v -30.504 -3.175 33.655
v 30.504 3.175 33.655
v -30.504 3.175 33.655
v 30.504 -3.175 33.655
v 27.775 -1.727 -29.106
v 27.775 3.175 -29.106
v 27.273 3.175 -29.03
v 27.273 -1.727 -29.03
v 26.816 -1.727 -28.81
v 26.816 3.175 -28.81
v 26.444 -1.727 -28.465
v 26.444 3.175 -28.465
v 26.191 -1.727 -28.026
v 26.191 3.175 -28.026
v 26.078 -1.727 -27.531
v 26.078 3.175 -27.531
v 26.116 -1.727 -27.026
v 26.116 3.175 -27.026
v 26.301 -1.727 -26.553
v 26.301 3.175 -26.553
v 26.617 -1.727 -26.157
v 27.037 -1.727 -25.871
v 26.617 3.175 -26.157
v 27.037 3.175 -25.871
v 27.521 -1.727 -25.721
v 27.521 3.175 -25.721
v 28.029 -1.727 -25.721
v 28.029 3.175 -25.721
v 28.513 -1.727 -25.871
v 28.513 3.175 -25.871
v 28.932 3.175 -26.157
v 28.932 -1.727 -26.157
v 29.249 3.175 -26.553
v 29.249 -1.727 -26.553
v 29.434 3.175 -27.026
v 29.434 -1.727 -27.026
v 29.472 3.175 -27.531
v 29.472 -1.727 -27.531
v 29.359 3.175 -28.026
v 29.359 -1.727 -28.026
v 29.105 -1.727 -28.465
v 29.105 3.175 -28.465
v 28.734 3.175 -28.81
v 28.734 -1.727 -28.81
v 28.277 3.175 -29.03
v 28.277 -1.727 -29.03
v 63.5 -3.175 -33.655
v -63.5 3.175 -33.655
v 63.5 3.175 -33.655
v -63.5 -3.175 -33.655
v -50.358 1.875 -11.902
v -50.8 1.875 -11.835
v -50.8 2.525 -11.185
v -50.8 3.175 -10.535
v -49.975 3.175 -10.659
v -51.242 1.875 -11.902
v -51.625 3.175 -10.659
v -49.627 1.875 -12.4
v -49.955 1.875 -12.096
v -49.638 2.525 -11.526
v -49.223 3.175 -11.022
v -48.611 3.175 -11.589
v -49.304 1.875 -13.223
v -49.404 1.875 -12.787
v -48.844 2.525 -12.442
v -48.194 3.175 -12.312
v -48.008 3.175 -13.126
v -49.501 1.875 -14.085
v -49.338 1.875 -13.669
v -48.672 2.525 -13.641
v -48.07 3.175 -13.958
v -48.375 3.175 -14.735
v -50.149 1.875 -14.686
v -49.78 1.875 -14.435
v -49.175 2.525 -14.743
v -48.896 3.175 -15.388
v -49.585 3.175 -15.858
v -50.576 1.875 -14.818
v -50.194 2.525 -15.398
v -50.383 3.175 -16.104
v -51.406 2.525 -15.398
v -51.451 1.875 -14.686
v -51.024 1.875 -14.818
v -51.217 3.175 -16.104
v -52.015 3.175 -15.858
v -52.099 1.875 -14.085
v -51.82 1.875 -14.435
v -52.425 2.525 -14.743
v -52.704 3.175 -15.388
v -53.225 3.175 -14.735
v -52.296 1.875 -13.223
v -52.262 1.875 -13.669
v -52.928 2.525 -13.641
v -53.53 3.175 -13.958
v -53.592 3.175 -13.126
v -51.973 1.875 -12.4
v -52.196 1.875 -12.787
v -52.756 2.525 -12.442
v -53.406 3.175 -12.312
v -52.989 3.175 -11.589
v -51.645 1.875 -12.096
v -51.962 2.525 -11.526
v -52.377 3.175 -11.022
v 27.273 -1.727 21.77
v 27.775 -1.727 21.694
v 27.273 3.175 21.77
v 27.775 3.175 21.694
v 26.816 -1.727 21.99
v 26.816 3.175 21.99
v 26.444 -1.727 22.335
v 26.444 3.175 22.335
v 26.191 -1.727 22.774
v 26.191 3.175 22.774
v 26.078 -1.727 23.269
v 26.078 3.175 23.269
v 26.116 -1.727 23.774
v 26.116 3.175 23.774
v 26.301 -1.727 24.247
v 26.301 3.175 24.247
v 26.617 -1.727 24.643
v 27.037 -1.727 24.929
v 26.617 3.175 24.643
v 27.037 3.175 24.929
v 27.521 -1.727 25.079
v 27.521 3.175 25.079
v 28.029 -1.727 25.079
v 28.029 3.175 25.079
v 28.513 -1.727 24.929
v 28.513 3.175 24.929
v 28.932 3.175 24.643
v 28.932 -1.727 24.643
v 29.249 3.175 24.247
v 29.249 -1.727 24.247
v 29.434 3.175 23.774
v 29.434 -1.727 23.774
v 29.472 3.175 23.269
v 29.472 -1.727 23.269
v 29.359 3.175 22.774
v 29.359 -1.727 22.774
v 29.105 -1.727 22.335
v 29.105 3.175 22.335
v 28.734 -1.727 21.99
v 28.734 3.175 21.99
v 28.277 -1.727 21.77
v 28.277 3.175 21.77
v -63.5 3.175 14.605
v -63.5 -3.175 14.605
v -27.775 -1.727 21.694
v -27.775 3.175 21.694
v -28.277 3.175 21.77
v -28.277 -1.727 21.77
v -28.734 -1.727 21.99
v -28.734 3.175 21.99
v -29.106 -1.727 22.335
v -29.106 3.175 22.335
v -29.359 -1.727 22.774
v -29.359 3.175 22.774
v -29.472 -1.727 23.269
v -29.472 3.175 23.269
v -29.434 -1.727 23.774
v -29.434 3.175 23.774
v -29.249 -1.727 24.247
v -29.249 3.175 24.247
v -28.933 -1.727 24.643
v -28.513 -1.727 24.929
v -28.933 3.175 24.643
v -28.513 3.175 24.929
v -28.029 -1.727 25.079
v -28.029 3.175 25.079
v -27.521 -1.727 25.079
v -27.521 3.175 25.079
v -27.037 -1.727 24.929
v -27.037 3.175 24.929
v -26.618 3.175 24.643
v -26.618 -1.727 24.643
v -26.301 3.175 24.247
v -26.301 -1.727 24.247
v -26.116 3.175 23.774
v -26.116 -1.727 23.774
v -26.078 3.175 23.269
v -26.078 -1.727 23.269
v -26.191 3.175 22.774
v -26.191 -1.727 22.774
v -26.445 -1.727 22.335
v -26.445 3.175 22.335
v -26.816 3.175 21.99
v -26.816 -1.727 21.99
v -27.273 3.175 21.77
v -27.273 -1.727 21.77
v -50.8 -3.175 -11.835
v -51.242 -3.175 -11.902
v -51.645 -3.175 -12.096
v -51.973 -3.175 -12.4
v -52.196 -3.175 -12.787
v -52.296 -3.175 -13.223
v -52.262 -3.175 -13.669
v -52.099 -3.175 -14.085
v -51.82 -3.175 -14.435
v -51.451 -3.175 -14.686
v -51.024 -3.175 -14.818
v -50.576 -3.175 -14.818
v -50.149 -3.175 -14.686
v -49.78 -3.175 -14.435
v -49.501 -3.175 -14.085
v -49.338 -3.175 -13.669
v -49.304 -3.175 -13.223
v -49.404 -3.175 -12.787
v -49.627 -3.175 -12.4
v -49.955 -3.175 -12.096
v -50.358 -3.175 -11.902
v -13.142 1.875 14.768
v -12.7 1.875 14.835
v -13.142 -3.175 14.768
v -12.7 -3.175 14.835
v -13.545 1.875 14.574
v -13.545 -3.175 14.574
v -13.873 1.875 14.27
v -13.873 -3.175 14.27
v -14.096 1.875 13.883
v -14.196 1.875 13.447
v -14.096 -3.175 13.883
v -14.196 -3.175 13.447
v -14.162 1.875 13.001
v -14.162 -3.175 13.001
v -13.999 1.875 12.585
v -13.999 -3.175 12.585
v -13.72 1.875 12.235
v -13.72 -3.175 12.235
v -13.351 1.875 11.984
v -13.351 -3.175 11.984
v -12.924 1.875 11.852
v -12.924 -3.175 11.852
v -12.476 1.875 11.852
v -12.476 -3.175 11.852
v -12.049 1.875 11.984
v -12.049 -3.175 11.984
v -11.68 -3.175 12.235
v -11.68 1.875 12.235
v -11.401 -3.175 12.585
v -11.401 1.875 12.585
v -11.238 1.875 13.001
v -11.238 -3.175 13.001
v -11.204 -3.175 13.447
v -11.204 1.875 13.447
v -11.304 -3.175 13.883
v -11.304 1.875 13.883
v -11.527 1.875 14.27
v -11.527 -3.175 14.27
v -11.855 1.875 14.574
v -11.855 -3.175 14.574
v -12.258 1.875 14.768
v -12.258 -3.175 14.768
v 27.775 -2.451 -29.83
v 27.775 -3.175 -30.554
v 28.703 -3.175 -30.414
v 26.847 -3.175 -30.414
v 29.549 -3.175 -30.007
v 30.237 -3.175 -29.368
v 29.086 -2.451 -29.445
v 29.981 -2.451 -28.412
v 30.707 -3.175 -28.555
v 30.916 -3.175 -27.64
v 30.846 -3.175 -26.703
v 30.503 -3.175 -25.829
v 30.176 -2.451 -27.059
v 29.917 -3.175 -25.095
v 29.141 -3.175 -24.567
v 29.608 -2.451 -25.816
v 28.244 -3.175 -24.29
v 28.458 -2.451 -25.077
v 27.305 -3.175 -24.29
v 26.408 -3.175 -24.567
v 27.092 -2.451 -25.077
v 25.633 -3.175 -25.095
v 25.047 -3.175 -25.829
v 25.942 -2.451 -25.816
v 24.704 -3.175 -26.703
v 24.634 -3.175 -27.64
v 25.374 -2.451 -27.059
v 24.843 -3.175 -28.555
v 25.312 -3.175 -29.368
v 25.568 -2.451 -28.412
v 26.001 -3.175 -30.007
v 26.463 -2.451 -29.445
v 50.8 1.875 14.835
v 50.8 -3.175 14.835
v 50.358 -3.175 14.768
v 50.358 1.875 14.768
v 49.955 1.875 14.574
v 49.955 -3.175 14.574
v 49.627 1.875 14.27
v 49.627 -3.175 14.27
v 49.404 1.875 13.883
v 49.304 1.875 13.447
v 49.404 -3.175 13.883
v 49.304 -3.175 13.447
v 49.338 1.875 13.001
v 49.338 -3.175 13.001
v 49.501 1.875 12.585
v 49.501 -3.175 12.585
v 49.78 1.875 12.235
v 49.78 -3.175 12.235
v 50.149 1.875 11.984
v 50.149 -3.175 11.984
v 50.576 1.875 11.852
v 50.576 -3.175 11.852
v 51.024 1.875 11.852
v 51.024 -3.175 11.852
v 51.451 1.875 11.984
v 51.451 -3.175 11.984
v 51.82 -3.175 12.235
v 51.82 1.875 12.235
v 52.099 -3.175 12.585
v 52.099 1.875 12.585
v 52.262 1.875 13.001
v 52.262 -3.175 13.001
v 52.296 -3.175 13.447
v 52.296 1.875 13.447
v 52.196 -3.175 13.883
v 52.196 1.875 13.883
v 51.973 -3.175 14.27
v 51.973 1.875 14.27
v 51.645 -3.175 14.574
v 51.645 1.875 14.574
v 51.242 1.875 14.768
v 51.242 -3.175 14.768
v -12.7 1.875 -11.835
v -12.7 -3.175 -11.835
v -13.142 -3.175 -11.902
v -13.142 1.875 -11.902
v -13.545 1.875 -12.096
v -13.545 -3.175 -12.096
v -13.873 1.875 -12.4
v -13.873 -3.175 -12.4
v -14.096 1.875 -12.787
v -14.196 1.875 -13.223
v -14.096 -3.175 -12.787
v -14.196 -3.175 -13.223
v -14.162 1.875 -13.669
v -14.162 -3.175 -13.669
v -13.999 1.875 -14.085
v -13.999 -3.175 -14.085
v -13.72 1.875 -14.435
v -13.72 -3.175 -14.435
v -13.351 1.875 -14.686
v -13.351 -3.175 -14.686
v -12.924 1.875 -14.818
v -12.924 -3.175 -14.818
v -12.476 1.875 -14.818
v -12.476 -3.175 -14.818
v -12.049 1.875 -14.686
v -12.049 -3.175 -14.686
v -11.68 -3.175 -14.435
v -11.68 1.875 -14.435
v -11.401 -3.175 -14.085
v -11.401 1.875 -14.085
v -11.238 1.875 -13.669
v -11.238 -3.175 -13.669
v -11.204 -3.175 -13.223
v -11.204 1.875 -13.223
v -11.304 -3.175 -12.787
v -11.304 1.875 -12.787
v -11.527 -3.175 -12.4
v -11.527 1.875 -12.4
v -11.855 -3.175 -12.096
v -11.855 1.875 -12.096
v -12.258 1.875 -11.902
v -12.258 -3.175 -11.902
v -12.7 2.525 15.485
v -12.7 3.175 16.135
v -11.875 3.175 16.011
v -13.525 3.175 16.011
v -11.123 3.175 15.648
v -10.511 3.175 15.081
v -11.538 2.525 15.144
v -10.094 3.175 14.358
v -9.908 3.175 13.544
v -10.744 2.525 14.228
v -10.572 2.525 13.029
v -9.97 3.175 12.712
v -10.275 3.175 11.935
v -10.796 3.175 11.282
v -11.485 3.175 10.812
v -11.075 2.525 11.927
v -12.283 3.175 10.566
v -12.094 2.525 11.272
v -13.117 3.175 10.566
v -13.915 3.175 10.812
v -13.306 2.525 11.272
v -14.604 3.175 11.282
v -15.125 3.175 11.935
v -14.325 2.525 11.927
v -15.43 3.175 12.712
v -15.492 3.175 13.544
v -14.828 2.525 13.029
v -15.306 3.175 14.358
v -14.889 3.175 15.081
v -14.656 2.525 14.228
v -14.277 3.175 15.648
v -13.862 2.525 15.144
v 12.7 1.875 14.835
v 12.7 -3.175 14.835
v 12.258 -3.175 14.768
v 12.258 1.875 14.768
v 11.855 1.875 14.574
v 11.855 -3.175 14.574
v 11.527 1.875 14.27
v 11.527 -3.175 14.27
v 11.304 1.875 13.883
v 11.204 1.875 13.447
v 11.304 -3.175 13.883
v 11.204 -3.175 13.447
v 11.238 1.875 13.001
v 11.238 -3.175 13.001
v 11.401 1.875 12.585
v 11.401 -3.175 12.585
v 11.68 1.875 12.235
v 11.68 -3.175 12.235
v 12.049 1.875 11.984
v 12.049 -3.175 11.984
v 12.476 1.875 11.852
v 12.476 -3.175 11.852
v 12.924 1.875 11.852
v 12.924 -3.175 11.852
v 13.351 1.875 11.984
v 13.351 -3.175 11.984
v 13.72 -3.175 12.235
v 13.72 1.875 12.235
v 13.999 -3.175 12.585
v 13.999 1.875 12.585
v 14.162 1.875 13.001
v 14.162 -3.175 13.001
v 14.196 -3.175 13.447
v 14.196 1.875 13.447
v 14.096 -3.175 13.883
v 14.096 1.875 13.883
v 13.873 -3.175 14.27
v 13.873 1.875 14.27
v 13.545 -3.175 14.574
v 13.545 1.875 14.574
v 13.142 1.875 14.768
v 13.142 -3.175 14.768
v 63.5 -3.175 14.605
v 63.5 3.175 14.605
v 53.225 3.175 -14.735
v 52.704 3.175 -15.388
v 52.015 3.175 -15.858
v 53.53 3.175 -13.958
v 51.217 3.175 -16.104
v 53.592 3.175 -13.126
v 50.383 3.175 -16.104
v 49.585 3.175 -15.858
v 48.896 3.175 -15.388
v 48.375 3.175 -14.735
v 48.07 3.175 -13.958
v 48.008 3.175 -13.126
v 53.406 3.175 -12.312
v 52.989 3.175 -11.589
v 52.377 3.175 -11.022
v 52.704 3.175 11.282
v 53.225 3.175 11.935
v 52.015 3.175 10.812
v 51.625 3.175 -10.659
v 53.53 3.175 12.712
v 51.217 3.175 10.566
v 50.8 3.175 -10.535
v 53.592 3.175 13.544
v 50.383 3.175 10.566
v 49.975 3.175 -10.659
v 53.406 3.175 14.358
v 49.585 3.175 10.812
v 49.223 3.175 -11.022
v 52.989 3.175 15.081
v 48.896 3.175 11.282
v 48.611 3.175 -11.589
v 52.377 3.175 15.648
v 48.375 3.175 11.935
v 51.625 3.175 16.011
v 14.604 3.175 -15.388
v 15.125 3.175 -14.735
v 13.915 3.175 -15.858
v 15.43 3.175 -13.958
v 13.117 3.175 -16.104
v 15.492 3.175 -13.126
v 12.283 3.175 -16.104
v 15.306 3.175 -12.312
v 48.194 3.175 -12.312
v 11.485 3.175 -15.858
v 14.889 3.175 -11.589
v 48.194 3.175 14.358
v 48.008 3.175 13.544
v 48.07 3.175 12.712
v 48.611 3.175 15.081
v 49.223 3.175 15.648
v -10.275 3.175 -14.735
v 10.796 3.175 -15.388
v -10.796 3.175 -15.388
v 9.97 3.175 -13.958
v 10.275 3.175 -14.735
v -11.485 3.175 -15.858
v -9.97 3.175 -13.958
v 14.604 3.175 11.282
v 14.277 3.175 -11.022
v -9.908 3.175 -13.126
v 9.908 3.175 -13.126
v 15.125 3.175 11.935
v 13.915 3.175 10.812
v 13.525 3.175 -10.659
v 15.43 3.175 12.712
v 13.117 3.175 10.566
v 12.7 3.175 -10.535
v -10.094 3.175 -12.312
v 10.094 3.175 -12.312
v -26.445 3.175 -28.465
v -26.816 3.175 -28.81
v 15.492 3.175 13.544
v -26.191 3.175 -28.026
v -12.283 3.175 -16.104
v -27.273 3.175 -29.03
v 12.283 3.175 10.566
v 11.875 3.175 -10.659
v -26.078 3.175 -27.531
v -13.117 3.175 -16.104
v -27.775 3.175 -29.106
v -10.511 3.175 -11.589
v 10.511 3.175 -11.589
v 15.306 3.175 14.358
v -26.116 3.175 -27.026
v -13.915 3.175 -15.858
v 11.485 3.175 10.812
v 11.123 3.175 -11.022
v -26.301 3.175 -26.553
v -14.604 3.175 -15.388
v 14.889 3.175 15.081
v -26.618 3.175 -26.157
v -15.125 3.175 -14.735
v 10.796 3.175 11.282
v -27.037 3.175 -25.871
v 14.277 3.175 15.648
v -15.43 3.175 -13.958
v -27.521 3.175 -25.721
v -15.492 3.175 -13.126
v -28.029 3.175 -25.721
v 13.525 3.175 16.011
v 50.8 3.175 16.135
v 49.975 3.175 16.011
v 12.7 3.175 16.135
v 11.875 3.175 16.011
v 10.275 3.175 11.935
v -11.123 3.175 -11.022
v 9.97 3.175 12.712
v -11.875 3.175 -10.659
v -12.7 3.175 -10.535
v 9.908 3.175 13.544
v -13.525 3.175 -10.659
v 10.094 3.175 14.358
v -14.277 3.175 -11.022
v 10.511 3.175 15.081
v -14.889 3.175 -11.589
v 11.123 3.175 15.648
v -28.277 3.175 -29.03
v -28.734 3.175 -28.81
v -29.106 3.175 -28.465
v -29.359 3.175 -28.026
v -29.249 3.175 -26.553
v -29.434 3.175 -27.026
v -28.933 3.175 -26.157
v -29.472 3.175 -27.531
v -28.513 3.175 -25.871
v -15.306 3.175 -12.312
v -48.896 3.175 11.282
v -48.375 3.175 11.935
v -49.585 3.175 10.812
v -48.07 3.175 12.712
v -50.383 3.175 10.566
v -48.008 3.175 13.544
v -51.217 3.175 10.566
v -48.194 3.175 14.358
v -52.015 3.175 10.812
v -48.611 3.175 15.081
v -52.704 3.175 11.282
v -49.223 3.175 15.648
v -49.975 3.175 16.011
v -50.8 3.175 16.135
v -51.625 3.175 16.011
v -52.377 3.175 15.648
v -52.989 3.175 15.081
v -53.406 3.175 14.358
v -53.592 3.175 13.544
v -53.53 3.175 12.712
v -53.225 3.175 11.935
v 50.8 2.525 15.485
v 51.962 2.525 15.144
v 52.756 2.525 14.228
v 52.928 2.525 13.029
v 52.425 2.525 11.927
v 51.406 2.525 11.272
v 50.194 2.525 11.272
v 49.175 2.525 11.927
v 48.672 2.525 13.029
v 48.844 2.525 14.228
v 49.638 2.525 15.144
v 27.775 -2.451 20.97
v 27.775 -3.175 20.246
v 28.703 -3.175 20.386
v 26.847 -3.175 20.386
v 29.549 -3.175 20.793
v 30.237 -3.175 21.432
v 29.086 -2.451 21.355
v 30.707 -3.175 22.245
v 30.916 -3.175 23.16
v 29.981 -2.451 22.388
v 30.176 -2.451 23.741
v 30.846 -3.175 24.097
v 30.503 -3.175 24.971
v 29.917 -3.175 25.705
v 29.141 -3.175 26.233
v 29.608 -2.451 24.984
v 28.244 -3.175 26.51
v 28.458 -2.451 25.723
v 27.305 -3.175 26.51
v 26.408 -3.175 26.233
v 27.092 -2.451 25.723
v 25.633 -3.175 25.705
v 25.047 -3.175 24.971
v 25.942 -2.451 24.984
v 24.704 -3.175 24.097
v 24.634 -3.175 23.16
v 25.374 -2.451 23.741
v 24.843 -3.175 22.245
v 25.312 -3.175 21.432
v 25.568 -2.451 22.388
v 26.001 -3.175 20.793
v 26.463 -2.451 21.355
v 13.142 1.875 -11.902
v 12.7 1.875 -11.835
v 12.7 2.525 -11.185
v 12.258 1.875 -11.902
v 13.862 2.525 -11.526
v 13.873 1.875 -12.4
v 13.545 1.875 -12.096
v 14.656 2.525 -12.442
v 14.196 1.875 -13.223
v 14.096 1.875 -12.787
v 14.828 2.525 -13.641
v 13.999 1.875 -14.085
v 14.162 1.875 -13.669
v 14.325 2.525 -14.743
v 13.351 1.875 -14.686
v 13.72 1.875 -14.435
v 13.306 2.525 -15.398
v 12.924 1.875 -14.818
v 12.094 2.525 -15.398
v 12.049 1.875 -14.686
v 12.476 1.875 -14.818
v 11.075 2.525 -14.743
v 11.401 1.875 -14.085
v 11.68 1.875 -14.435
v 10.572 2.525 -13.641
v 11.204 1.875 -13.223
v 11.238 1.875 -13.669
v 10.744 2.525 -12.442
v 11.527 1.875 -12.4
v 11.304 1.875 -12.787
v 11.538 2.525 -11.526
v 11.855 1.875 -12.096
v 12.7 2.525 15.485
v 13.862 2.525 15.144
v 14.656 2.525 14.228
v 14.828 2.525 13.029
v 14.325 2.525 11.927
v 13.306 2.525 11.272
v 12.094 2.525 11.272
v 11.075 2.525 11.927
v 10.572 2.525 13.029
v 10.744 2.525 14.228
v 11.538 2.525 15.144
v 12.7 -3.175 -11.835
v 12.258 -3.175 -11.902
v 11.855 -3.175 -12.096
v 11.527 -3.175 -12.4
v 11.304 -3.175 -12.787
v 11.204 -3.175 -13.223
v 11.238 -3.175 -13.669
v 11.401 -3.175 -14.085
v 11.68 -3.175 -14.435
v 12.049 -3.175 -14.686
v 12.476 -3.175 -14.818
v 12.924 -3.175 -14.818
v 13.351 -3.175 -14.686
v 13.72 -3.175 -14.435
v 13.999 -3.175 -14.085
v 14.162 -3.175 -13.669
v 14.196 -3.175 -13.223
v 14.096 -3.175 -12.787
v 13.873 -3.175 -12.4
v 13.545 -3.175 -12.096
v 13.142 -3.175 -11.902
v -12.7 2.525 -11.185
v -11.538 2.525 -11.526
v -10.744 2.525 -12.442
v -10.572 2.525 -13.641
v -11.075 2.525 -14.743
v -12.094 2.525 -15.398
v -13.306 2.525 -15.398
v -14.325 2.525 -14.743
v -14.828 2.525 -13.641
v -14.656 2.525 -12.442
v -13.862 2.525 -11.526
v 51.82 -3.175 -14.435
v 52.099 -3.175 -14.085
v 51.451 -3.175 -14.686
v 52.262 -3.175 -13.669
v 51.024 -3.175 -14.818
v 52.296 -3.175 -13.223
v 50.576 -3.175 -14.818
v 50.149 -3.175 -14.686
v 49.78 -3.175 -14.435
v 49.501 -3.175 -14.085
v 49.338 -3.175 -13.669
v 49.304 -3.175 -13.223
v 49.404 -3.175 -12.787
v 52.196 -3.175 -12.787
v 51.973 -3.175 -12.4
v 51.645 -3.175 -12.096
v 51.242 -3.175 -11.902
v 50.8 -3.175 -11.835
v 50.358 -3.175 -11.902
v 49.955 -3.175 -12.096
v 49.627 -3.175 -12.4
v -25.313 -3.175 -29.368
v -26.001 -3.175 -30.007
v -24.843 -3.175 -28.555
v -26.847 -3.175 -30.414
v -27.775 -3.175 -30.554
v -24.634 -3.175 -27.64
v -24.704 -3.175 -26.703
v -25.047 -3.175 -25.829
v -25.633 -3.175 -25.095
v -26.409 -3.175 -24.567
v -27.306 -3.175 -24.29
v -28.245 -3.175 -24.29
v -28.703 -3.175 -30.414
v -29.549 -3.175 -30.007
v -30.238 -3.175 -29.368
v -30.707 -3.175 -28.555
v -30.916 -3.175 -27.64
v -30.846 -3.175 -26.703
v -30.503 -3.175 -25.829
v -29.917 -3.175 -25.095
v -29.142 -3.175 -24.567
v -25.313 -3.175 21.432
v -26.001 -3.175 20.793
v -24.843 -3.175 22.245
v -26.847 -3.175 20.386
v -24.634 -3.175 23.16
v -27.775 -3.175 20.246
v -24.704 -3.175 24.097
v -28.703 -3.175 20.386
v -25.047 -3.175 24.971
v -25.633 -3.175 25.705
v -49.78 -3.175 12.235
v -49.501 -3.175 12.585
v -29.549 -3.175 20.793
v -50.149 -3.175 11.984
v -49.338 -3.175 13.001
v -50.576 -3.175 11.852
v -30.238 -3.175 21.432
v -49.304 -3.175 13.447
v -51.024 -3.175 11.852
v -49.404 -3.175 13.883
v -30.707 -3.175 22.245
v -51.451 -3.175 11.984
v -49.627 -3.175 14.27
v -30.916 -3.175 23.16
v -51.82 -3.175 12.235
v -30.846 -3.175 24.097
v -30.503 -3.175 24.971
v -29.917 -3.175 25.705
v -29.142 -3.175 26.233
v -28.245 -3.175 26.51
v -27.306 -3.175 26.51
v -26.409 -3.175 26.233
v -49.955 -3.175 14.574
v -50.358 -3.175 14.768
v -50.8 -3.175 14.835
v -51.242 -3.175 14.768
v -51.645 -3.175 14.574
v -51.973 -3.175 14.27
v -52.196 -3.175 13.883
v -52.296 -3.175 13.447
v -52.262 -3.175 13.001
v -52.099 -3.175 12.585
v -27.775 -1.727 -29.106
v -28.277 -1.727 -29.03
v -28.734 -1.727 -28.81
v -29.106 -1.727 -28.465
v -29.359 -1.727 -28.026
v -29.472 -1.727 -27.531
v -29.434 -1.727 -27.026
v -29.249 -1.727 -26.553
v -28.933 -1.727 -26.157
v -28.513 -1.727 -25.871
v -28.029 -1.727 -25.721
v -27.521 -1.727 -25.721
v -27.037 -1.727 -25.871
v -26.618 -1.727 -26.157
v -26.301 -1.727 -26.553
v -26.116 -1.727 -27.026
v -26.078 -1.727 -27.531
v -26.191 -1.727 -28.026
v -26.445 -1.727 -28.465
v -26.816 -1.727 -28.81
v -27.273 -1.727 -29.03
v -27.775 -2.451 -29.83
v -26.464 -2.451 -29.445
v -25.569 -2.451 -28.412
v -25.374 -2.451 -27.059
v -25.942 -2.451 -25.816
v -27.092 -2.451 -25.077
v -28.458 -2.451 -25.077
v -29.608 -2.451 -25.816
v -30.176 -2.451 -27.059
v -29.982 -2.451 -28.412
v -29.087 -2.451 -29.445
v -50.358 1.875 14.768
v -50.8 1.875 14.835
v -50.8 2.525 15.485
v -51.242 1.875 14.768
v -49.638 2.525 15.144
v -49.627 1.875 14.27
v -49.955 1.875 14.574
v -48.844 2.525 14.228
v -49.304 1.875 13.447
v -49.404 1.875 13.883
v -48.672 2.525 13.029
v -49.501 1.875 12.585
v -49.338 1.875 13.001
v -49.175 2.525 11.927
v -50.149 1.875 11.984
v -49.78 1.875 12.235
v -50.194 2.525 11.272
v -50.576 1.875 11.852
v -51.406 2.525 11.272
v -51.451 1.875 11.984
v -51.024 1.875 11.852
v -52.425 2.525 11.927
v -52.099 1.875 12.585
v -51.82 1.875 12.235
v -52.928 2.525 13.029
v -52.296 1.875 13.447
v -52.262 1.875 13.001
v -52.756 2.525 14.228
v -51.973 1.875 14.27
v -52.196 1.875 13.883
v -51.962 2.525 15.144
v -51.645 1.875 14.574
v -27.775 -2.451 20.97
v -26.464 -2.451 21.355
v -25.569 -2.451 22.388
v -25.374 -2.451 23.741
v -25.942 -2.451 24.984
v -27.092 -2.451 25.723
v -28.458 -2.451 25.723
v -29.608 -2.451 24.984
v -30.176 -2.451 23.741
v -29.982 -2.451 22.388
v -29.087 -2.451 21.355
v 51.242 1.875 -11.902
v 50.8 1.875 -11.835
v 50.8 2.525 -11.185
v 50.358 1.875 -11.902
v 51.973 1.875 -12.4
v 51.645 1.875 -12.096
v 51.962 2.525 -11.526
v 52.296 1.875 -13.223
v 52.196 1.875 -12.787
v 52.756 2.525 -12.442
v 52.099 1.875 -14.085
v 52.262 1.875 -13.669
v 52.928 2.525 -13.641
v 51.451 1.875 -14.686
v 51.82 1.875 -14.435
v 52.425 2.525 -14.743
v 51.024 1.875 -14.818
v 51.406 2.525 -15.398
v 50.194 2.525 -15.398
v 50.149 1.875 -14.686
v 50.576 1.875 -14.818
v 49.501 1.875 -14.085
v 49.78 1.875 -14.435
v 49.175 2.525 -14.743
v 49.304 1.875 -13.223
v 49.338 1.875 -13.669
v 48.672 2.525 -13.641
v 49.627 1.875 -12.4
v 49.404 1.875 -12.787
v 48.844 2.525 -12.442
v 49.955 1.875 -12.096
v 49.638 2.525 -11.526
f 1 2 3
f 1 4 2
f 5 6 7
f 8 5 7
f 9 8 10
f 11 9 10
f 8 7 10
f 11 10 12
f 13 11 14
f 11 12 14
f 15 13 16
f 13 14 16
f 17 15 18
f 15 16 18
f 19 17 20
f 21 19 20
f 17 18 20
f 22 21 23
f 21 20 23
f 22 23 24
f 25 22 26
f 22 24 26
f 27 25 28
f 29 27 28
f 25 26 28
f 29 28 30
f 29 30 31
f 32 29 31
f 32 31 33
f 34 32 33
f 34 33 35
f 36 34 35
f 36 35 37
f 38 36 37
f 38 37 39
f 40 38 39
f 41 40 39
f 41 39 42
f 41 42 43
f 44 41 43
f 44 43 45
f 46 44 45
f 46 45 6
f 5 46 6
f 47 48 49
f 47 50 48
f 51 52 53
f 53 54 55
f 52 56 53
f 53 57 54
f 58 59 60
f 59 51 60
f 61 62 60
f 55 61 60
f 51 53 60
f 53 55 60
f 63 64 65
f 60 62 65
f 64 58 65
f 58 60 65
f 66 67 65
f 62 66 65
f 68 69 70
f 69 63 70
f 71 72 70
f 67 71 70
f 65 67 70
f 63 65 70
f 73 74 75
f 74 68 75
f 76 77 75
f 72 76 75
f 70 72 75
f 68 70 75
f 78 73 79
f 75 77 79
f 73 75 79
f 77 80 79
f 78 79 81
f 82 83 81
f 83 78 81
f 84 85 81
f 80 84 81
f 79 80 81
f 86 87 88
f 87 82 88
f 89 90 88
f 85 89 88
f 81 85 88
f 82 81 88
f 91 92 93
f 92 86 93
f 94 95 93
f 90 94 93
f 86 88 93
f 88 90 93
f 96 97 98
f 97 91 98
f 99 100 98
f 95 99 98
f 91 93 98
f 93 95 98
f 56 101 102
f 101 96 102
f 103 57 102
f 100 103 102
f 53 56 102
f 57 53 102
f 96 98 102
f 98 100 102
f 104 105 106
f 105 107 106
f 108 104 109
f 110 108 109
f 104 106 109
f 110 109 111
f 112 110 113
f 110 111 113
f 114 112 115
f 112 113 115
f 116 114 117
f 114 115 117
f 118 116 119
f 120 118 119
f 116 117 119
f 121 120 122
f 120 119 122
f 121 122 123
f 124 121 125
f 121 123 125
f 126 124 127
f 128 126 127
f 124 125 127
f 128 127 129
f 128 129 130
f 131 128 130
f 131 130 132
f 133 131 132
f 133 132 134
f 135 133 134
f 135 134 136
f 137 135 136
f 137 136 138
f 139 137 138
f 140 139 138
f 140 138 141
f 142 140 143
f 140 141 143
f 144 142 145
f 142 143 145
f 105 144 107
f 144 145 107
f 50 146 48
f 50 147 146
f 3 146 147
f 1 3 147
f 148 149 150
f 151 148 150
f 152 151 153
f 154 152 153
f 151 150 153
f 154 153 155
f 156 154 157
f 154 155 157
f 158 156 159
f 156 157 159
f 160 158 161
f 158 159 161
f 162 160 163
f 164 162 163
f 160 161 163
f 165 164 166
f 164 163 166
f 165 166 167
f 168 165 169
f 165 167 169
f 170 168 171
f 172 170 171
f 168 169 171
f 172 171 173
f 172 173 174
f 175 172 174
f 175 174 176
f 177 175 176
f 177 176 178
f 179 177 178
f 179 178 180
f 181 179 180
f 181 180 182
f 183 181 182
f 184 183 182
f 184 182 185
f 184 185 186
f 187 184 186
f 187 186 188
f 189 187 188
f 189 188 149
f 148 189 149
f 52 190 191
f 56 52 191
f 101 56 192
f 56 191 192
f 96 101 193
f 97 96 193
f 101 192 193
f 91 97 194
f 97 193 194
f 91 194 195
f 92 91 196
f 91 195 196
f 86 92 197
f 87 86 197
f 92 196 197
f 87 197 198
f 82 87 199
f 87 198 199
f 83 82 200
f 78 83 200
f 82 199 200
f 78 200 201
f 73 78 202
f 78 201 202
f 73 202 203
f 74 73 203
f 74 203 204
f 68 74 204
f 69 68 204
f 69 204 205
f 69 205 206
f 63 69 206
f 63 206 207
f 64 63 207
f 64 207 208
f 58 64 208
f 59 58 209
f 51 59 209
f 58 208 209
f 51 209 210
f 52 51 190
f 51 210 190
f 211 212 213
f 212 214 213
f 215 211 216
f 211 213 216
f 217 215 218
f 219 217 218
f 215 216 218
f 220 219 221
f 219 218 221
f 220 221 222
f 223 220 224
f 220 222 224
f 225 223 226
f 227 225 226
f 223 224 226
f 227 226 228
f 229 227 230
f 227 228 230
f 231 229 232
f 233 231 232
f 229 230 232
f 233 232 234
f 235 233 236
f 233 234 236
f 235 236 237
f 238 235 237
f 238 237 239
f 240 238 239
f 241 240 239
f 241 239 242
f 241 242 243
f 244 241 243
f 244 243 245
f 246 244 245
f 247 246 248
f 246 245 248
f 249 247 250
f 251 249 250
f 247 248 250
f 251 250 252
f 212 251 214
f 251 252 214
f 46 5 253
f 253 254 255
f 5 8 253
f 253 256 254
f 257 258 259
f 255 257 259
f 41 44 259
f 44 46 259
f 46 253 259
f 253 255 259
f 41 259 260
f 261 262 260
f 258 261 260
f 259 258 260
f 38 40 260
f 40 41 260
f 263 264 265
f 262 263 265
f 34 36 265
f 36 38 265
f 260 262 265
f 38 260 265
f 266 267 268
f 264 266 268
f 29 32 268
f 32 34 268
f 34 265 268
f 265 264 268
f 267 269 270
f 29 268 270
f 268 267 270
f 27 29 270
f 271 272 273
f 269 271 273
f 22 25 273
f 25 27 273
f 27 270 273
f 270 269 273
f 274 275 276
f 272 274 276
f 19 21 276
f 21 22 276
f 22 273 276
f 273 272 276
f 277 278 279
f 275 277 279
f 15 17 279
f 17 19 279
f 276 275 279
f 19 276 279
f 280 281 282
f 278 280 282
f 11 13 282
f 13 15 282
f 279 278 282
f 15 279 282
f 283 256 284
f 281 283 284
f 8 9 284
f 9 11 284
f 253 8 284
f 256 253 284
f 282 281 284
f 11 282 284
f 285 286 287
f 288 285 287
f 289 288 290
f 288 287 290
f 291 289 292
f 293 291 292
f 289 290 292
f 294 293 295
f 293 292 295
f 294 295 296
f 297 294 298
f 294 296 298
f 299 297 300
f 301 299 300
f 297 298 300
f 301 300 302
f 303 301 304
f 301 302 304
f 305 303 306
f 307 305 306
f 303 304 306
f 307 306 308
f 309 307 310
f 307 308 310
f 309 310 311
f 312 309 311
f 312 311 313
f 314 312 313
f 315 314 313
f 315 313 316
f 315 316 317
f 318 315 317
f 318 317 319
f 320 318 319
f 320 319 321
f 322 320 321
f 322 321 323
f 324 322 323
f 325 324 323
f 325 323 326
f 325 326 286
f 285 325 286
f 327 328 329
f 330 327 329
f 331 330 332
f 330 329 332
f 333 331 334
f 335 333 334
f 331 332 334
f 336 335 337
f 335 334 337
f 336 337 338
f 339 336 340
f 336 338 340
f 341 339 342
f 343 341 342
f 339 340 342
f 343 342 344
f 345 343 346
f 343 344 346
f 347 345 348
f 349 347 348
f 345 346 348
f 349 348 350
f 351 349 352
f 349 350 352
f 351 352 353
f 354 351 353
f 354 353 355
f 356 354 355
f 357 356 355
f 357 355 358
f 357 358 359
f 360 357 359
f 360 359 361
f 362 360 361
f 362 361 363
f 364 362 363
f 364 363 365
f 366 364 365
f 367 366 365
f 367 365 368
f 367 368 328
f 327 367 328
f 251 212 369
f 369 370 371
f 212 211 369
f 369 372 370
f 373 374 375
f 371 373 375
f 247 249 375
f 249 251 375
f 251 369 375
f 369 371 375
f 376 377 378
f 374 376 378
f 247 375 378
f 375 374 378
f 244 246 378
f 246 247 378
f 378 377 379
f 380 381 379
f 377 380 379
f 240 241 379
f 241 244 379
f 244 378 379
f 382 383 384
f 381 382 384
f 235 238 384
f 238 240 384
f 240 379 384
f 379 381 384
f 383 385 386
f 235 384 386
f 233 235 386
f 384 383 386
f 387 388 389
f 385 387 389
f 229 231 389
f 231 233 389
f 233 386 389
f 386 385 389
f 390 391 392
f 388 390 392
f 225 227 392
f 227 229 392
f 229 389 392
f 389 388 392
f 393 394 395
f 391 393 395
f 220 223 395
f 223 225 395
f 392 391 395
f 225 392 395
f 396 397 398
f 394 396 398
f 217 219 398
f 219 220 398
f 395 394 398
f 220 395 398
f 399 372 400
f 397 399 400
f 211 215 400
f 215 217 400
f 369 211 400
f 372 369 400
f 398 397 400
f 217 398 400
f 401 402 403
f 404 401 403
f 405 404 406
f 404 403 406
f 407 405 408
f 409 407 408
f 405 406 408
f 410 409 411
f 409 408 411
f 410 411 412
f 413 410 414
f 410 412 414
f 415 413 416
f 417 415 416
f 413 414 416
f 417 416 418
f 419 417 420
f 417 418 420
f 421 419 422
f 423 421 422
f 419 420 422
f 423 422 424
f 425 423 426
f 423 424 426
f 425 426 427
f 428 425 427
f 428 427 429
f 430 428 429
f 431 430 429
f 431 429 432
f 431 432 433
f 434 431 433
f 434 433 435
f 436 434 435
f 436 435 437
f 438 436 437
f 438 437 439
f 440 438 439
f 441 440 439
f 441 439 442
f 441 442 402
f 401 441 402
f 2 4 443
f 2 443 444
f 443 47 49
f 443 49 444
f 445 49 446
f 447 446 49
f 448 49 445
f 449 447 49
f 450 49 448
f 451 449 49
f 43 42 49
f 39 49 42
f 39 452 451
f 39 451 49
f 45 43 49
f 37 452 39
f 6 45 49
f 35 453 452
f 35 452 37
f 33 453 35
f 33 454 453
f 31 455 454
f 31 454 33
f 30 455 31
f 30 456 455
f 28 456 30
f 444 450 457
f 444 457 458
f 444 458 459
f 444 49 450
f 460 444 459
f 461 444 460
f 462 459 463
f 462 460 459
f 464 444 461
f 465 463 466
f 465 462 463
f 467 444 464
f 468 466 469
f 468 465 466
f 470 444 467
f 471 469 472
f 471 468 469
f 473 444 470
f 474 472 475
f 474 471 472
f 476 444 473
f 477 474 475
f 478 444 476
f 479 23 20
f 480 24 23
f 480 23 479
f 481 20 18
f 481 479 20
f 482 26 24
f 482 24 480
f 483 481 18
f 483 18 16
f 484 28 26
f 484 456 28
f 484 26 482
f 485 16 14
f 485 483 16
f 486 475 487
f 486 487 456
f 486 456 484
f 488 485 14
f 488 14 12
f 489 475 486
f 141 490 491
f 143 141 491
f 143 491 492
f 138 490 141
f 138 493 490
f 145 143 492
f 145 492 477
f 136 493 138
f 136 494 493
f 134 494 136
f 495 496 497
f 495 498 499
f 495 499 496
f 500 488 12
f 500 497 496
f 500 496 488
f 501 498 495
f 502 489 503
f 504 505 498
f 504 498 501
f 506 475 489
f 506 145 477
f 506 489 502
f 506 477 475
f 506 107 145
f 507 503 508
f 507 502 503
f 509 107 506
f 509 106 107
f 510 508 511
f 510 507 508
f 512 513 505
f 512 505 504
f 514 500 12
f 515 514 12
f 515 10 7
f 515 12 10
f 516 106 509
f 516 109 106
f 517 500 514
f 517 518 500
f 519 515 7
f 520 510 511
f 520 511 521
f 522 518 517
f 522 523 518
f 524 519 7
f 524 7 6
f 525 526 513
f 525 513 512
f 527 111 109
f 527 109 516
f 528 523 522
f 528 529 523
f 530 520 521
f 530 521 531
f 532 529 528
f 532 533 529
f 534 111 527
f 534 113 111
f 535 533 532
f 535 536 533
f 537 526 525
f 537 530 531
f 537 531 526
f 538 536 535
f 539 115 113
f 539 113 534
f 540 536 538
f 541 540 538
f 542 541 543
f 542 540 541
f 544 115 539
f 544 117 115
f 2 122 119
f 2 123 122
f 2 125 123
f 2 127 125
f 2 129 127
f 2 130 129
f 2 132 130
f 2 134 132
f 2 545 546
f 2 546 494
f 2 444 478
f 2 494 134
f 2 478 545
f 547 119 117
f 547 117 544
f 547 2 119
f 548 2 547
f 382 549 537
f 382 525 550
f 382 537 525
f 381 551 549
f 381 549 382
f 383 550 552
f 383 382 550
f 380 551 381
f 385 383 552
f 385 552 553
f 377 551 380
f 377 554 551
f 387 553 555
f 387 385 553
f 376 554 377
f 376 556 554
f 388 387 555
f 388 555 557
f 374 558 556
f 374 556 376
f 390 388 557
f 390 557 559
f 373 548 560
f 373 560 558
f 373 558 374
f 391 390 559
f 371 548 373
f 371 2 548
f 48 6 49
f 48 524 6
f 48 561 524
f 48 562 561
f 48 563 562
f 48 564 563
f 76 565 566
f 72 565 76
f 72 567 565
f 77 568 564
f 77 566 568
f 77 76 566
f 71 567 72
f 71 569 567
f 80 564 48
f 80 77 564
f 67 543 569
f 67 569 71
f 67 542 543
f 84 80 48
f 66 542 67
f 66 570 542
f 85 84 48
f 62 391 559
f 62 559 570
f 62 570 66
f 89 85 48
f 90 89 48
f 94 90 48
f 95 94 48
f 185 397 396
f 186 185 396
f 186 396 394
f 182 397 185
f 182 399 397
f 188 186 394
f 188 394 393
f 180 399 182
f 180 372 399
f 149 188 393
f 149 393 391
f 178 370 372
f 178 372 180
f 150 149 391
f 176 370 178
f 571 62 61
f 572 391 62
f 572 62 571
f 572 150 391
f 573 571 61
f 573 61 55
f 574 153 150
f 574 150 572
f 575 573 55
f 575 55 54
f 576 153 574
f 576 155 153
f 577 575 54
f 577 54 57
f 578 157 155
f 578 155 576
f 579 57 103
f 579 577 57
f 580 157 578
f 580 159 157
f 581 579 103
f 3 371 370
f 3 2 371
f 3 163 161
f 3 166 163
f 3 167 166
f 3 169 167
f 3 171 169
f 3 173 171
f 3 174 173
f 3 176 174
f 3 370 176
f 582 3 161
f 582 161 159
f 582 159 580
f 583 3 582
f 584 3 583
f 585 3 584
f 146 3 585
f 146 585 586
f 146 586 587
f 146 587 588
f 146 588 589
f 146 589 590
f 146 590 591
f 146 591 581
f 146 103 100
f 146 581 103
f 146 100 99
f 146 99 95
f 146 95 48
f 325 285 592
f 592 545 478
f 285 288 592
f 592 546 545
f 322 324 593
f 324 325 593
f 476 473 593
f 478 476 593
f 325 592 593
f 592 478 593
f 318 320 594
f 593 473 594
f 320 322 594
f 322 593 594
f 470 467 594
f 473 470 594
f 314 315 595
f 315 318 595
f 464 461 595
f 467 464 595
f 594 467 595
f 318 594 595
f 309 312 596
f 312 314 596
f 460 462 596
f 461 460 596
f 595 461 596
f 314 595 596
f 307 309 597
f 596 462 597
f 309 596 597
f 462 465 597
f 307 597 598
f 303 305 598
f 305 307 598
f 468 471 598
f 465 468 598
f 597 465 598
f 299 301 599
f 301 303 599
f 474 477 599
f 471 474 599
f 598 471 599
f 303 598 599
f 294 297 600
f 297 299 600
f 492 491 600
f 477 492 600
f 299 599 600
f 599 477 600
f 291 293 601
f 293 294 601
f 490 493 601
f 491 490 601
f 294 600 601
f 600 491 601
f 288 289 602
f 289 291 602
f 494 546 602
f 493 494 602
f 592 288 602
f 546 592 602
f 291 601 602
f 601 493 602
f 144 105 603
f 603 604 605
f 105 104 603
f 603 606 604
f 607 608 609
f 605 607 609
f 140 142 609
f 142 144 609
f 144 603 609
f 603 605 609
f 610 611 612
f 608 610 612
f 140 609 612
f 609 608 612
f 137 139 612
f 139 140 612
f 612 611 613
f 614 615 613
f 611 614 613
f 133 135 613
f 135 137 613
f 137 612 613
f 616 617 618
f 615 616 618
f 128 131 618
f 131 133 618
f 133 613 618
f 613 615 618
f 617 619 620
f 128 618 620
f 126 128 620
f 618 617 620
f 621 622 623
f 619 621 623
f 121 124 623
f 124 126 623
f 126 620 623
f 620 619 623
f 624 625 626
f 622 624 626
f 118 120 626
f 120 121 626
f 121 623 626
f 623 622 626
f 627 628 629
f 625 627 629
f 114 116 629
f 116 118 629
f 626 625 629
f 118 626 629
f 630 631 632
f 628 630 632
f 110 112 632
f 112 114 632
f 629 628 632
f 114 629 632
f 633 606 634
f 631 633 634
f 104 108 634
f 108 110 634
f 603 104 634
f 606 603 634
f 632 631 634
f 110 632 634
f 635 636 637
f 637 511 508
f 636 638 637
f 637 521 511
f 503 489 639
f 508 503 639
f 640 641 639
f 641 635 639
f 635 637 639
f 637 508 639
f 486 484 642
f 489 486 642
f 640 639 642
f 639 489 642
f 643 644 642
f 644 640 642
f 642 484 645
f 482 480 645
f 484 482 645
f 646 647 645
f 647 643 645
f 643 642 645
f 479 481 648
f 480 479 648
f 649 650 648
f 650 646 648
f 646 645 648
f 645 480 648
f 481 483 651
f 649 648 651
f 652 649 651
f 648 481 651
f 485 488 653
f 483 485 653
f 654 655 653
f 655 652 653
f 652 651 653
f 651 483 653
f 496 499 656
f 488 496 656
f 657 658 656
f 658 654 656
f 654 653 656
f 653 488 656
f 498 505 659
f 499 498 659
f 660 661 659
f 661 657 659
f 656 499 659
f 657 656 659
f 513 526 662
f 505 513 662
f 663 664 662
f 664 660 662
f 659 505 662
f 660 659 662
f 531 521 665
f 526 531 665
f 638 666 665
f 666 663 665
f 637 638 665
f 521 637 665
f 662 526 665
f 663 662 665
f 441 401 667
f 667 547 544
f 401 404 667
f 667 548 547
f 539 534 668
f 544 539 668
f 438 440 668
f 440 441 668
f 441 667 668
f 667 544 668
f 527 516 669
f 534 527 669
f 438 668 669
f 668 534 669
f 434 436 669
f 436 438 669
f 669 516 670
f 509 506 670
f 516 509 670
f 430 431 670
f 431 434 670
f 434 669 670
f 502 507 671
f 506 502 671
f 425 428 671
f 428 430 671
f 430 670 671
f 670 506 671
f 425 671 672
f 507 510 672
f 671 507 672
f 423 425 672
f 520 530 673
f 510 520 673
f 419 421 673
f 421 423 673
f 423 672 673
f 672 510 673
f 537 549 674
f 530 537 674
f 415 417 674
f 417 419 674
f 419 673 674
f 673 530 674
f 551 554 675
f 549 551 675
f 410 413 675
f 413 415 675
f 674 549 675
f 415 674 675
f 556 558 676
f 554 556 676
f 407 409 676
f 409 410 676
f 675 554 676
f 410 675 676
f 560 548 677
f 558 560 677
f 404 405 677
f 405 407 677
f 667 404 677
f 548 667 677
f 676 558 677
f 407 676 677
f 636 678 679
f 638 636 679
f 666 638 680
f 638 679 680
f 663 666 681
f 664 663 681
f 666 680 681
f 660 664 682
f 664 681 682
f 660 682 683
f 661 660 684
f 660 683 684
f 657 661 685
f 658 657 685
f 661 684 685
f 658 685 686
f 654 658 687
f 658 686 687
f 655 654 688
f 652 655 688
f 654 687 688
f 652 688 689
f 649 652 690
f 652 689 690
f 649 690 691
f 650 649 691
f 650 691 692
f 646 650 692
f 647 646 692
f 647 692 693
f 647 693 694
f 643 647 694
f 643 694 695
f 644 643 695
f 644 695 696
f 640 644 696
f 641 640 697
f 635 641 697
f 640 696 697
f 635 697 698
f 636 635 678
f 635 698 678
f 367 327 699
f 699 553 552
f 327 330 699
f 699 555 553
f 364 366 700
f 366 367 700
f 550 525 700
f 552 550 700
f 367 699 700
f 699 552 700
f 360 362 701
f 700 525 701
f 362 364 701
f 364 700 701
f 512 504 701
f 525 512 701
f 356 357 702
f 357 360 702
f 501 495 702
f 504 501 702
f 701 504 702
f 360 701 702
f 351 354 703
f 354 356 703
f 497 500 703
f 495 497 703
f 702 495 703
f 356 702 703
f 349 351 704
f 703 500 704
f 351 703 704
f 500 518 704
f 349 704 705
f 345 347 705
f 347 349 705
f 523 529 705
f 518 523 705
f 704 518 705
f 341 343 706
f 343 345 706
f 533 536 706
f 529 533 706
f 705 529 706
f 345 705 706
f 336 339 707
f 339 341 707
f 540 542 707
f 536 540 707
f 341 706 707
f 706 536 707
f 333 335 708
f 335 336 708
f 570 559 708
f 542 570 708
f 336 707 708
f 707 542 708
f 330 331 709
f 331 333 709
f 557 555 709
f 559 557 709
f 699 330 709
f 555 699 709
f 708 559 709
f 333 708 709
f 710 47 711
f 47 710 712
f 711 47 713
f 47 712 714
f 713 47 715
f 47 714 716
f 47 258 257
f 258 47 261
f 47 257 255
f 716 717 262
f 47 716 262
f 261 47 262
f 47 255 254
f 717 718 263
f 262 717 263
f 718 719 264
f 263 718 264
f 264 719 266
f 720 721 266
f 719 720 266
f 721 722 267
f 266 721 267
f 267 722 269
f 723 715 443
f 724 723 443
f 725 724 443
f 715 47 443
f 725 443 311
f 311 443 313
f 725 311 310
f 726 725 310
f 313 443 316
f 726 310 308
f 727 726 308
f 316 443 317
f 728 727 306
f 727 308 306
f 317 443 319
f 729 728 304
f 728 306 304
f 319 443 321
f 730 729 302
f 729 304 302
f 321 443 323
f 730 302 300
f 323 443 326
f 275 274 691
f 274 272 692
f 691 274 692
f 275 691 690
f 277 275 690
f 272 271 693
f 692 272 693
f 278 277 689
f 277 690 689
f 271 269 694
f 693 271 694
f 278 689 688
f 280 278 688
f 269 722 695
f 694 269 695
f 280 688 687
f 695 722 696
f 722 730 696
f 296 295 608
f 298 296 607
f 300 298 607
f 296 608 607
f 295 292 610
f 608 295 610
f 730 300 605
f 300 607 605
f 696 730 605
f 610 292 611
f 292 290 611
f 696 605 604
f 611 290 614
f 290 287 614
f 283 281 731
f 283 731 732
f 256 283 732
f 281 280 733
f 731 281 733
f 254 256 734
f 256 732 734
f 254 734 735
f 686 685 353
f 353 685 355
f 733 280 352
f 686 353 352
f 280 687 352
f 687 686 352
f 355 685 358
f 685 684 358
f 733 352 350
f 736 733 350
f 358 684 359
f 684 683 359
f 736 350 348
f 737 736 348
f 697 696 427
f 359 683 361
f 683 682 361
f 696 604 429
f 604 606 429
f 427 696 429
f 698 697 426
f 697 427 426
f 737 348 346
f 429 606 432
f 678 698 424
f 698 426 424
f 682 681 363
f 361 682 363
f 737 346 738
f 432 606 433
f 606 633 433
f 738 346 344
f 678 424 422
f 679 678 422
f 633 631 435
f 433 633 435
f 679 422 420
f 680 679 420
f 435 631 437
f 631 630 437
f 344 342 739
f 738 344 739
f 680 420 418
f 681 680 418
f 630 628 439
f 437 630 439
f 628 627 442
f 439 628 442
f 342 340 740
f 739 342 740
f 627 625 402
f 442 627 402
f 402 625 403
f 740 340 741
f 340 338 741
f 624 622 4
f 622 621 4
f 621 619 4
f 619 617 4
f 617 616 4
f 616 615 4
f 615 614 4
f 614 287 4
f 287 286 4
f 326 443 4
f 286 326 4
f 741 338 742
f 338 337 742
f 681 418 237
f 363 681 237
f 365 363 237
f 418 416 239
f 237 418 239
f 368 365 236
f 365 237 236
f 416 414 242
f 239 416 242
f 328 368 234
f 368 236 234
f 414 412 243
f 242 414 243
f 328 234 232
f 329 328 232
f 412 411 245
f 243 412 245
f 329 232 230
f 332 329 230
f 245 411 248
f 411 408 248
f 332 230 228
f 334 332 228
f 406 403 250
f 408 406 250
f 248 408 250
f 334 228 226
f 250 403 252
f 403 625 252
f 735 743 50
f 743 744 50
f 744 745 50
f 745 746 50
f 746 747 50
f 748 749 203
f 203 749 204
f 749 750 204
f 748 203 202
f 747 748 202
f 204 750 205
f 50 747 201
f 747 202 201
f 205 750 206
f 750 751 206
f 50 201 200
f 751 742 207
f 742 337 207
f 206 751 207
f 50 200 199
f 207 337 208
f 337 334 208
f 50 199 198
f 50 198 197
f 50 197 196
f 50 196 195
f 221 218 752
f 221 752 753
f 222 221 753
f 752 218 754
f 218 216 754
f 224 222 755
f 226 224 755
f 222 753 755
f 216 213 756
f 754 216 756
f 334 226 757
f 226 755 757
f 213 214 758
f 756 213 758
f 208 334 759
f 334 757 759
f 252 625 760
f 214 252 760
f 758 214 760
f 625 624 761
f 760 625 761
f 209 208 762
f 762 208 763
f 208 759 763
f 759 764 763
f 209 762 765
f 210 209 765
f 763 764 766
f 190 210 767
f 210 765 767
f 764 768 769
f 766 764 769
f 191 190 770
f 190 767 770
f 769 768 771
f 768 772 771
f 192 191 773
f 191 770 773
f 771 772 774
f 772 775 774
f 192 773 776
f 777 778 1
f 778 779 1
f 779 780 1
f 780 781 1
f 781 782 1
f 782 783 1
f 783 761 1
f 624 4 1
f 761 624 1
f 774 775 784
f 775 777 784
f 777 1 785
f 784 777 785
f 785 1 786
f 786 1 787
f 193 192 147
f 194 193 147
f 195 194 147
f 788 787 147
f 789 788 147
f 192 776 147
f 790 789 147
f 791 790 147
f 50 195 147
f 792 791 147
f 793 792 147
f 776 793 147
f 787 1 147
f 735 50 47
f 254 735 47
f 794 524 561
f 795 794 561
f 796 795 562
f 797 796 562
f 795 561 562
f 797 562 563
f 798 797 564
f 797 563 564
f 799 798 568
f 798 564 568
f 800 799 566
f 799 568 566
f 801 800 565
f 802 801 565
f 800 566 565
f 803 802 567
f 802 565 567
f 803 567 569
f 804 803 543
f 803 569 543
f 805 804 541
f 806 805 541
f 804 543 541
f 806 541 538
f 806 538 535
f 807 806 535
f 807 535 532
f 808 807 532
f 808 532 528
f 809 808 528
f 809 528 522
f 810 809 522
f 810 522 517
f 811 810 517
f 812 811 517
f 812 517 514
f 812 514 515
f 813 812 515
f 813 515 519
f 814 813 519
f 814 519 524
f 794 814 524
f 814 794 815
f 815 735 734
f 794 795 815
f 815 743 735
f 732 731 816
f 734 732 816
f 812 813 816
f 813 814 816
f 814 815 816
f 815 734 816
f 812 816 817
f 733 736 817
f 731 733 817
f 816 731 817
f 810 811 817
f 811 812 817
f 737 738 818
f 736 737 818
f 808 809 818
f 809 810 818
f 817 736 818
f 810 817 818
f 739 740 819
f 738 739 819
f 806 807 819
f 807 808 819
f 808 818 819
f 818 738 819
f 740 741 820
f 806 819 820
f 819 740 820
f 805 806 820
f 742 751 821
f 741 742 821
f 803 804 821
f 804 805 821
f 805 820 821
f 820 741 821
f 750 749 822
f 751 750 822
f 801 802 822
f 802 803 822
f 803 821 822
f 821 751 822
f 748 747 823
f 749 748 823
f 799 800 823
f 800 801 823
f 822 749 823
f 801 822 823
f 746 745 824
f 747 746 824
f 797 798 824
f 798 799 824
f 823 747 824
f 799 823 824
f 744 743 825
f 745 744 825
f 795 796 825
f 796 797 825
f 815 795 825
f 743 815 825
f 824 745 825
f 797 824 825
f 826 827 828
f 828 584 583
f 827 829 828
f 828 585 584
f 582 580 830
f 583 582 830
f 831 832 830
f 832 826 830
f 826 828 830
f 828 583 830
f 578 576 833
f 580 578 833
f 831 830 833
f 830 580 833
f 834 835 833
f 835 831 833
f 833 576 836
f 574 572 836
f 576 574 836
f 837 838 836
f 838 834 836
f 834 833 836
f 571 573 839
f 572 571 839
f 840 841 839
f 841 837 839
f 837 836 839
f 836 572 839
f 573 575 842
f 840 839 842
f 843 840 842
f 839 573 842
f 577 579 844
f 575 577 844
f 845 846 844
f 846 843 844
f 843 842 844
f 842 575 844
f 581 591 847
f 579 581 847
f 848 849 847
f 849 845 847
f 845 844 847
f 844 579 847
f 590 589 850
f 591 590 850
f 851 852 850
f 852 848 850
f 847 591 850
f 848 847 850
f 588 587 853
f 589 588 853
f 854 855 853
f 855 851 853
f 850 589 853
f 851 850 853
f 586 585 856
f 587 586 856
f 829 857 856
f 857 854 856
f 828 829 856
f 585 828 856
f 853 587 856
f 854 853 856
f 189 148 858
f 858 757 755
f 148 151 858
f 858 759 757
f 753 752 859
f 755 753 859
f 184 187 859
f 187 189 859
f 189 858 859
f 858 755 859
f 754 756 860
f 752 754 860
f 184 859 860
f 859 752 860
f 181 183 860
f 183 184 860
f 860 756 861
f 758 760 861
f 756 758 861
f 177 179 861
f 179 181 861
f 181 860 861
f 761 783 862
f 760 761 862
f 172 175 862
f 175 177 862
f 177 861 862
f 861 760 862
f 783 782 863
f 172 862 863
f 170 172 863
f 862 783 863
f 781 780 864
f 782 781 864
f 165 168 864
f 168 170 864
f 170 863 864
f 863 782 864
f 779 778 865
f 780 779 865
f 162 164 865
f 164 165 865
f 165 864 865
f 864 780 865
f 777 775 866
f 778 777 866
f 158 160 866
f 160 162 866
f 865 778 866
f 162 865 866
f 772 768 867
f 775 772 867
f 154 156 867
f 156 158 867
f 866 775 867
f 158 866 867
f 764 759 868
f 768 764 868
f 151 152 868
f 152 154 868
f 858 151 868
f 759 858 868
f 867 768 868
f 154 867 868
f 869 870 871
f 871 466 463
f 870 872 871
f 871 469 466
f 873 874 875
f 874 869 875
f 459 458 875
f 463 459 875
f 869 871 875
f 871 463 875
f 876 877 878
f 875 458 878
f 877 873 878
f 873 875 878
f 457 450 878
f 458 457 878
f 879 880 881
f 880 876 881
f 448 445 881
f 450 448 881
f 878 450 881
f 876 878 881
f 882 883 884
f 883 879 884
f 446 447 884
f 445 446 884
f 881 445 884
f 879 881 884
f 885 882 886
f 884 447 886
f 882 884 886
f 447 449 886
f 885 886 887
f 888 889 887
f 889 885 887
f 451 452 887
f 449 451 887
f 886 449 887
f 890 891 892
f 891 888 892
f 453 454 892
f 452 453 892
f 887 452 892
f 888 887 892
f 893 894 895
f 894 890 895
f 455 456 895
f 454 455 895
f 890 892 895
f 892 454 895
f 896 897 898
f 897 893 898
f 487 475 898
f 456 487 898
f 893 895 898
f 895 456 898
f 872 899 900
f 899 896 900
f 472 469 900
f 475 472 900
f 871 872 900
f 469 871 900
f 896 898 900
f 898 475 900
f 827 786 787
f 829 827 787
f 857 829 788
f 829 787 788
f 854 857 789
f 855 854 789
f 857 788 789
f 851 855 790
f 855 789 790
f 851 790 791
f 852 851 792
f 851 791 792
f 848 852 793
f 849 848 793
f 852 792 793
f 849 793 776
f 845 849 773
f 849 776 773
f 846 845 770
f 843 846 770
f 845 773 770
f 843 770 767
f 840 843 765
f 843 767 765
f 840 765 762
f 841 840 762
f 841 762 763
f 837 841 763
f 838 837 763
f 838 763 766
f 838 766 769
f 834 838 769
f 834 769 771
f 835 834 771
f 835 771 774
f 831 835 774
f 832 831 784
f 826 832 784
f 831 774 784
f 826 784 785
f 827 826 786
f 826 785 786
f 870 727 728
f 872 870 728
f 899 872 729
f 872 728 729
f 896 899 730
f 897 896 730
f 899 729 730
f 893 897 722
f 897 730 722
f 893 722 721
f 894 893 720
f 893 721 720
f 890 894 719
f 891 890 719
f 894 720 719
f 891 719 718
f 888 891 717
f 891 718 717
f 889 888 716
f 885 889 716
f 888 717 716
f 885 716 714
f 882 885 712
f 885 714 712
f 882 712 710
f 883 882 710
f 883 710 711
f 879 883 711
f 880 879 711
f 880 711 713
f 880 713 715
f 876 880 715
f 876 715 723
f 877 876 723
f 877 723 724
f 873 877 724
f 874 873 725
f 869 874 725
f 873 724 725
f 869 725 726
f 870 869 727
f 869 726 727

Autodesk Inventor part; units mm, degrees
ref_plane "YZ Plane" through (0, 0, 0) normal (1, 0, 0) x (0, 1, 0)
ref_plane "XZ Plane" through (0, 0, 0) normal (0, 1, 0) x (-1, 0, 0)
ref_plane "XY Plane" through (0, 0, 0) normal (0, 0, 1) x (1, 0, 0)
sketch "Sketch1" plane through (0, 0, 0) normal (0, 1, 0) x (-1, 0, 0)
  line L0 (-63.5, 33.655) -> (63.5, 33.655)
  line L1 (63.5, 33.655) -> (63.5, -33.655)
  line L2 (63.5, -33.655) -> (-63.5, -33.655)
  line L3 (-63.5, -33.655) -> (-63.5, 33.655)
  line L4 (-63.5, 33.655) -> (63.5, -33.655) construction
  line L5 (63.5, 33.655) -> (-63.5, -33.655) construction
  point P0 (0, 0)
  dimension "d0" = 127
  dimension "d1" = 67.31
extrude "Extrusion1" add sketch "Sketch1" along normal mid plane 6.35
sketch "Sketch4" plane through (0, 3.175, 0) normal (0, 1, 0) x (1, 0, 0)
  line L0 (63.5, 33.655) -> (-63.5, 33.655) projected
  line L1 (-63.5, -33.655) -> (63.5, -33.655) projected
  line L2 (-63.5, 33.655) -> (-63.5, -33.655) projected
  line L3 (63.5, -33.655) -> (63.5, 33.655) projected
  point P0 (0, 0)
  point P1 (-50.8, 13.335)
  point P2 (-50.8, -13.335)
  point P3 (-12.7, 13.335)
  point P4 (-12.7, -13.335)
  point P5 (12.7, 13.335)
  point P6 (12.7, -13.335)
  point P7 (50.8, 13.335)
  point P8 (50.8, -13.335)
  point P9 (-50.8, -33.655)
  point P10 (50.8, -33.655)
  point P11 (-63.5, -20.955)
  point P12 (63.5, -20.955)
  dimension "d24" = 20.32
  dimension "d25" = 20.32
  dimension "d26" = 12.7
  dimension "d27" = 12.7
  dimension "d28" = 50.8
  dimension "d29" = 50.8
hole "Hole2" at (-50.8, 3.175, -13.335) at (-50.8, 3.175, 13.335) at (-12.7, 3.175, -13.335) at (-12.7, 3.175, 13.335) at (12.7, 3.175, -13.335) at (12.7, 3.175, 13.335) at (50.8, 3.175, -13.335) at (50.8, 3.175, 13.335) direction (0, -1, 0) diameter 3 depth 25.4 tip angle 118 countersink diameter 5.6 countersink angle 90
chamfer "Chamfer1" distance 19.05 angle 60 1 edges at (-63.5, 0, 33.655) measured on face at (-63.5, -1.0583, 11.2183)
sketch "Sketch5" plane through (0, -3.175, 0) normal (0, -1, 0) x (1, 0, 0)
  circle A0 centre (-27.7751, 23.3958) radius 1.7018 projected
  circle A1 centre (27.7749, 23.3958) radius 1.7018 projected
  circle A2 centre (27.7749, -27.4042) radius 1.7018 projected
  circle A3 centre (-27.7751, -27.4042) radius 1.7018 projected
  point P0 (0, 0)
hole "Hole3" at (-27.7751, -3.175, 23.3958) at (27.7749, -3.175, 23.3958) at (27.7749, -3.175, -27.4042) at (-27.7751, -3.175, -27.4042) direction (0, 1, 0) diameter 3.4036 end through all countersink diameter 6.2992 countersink angle 90 clearance for "Flat Head Machine Screw" size "M3" standard "Ansi Metric M Profile"
chamfer "Chamfer2" distance 19.05 angle 60 1 edges at (63.5, 0, 33.655) measured on face at (63.5, 1.0583, 11.2183)
equation "\"d25\" = d24"
equation "\"d27\" = d26"
equation "\"d28\" = d29"
properties part number "DPLX_P035 Spark Gap Shielding Middle" material "Polyethylene, High Density"
